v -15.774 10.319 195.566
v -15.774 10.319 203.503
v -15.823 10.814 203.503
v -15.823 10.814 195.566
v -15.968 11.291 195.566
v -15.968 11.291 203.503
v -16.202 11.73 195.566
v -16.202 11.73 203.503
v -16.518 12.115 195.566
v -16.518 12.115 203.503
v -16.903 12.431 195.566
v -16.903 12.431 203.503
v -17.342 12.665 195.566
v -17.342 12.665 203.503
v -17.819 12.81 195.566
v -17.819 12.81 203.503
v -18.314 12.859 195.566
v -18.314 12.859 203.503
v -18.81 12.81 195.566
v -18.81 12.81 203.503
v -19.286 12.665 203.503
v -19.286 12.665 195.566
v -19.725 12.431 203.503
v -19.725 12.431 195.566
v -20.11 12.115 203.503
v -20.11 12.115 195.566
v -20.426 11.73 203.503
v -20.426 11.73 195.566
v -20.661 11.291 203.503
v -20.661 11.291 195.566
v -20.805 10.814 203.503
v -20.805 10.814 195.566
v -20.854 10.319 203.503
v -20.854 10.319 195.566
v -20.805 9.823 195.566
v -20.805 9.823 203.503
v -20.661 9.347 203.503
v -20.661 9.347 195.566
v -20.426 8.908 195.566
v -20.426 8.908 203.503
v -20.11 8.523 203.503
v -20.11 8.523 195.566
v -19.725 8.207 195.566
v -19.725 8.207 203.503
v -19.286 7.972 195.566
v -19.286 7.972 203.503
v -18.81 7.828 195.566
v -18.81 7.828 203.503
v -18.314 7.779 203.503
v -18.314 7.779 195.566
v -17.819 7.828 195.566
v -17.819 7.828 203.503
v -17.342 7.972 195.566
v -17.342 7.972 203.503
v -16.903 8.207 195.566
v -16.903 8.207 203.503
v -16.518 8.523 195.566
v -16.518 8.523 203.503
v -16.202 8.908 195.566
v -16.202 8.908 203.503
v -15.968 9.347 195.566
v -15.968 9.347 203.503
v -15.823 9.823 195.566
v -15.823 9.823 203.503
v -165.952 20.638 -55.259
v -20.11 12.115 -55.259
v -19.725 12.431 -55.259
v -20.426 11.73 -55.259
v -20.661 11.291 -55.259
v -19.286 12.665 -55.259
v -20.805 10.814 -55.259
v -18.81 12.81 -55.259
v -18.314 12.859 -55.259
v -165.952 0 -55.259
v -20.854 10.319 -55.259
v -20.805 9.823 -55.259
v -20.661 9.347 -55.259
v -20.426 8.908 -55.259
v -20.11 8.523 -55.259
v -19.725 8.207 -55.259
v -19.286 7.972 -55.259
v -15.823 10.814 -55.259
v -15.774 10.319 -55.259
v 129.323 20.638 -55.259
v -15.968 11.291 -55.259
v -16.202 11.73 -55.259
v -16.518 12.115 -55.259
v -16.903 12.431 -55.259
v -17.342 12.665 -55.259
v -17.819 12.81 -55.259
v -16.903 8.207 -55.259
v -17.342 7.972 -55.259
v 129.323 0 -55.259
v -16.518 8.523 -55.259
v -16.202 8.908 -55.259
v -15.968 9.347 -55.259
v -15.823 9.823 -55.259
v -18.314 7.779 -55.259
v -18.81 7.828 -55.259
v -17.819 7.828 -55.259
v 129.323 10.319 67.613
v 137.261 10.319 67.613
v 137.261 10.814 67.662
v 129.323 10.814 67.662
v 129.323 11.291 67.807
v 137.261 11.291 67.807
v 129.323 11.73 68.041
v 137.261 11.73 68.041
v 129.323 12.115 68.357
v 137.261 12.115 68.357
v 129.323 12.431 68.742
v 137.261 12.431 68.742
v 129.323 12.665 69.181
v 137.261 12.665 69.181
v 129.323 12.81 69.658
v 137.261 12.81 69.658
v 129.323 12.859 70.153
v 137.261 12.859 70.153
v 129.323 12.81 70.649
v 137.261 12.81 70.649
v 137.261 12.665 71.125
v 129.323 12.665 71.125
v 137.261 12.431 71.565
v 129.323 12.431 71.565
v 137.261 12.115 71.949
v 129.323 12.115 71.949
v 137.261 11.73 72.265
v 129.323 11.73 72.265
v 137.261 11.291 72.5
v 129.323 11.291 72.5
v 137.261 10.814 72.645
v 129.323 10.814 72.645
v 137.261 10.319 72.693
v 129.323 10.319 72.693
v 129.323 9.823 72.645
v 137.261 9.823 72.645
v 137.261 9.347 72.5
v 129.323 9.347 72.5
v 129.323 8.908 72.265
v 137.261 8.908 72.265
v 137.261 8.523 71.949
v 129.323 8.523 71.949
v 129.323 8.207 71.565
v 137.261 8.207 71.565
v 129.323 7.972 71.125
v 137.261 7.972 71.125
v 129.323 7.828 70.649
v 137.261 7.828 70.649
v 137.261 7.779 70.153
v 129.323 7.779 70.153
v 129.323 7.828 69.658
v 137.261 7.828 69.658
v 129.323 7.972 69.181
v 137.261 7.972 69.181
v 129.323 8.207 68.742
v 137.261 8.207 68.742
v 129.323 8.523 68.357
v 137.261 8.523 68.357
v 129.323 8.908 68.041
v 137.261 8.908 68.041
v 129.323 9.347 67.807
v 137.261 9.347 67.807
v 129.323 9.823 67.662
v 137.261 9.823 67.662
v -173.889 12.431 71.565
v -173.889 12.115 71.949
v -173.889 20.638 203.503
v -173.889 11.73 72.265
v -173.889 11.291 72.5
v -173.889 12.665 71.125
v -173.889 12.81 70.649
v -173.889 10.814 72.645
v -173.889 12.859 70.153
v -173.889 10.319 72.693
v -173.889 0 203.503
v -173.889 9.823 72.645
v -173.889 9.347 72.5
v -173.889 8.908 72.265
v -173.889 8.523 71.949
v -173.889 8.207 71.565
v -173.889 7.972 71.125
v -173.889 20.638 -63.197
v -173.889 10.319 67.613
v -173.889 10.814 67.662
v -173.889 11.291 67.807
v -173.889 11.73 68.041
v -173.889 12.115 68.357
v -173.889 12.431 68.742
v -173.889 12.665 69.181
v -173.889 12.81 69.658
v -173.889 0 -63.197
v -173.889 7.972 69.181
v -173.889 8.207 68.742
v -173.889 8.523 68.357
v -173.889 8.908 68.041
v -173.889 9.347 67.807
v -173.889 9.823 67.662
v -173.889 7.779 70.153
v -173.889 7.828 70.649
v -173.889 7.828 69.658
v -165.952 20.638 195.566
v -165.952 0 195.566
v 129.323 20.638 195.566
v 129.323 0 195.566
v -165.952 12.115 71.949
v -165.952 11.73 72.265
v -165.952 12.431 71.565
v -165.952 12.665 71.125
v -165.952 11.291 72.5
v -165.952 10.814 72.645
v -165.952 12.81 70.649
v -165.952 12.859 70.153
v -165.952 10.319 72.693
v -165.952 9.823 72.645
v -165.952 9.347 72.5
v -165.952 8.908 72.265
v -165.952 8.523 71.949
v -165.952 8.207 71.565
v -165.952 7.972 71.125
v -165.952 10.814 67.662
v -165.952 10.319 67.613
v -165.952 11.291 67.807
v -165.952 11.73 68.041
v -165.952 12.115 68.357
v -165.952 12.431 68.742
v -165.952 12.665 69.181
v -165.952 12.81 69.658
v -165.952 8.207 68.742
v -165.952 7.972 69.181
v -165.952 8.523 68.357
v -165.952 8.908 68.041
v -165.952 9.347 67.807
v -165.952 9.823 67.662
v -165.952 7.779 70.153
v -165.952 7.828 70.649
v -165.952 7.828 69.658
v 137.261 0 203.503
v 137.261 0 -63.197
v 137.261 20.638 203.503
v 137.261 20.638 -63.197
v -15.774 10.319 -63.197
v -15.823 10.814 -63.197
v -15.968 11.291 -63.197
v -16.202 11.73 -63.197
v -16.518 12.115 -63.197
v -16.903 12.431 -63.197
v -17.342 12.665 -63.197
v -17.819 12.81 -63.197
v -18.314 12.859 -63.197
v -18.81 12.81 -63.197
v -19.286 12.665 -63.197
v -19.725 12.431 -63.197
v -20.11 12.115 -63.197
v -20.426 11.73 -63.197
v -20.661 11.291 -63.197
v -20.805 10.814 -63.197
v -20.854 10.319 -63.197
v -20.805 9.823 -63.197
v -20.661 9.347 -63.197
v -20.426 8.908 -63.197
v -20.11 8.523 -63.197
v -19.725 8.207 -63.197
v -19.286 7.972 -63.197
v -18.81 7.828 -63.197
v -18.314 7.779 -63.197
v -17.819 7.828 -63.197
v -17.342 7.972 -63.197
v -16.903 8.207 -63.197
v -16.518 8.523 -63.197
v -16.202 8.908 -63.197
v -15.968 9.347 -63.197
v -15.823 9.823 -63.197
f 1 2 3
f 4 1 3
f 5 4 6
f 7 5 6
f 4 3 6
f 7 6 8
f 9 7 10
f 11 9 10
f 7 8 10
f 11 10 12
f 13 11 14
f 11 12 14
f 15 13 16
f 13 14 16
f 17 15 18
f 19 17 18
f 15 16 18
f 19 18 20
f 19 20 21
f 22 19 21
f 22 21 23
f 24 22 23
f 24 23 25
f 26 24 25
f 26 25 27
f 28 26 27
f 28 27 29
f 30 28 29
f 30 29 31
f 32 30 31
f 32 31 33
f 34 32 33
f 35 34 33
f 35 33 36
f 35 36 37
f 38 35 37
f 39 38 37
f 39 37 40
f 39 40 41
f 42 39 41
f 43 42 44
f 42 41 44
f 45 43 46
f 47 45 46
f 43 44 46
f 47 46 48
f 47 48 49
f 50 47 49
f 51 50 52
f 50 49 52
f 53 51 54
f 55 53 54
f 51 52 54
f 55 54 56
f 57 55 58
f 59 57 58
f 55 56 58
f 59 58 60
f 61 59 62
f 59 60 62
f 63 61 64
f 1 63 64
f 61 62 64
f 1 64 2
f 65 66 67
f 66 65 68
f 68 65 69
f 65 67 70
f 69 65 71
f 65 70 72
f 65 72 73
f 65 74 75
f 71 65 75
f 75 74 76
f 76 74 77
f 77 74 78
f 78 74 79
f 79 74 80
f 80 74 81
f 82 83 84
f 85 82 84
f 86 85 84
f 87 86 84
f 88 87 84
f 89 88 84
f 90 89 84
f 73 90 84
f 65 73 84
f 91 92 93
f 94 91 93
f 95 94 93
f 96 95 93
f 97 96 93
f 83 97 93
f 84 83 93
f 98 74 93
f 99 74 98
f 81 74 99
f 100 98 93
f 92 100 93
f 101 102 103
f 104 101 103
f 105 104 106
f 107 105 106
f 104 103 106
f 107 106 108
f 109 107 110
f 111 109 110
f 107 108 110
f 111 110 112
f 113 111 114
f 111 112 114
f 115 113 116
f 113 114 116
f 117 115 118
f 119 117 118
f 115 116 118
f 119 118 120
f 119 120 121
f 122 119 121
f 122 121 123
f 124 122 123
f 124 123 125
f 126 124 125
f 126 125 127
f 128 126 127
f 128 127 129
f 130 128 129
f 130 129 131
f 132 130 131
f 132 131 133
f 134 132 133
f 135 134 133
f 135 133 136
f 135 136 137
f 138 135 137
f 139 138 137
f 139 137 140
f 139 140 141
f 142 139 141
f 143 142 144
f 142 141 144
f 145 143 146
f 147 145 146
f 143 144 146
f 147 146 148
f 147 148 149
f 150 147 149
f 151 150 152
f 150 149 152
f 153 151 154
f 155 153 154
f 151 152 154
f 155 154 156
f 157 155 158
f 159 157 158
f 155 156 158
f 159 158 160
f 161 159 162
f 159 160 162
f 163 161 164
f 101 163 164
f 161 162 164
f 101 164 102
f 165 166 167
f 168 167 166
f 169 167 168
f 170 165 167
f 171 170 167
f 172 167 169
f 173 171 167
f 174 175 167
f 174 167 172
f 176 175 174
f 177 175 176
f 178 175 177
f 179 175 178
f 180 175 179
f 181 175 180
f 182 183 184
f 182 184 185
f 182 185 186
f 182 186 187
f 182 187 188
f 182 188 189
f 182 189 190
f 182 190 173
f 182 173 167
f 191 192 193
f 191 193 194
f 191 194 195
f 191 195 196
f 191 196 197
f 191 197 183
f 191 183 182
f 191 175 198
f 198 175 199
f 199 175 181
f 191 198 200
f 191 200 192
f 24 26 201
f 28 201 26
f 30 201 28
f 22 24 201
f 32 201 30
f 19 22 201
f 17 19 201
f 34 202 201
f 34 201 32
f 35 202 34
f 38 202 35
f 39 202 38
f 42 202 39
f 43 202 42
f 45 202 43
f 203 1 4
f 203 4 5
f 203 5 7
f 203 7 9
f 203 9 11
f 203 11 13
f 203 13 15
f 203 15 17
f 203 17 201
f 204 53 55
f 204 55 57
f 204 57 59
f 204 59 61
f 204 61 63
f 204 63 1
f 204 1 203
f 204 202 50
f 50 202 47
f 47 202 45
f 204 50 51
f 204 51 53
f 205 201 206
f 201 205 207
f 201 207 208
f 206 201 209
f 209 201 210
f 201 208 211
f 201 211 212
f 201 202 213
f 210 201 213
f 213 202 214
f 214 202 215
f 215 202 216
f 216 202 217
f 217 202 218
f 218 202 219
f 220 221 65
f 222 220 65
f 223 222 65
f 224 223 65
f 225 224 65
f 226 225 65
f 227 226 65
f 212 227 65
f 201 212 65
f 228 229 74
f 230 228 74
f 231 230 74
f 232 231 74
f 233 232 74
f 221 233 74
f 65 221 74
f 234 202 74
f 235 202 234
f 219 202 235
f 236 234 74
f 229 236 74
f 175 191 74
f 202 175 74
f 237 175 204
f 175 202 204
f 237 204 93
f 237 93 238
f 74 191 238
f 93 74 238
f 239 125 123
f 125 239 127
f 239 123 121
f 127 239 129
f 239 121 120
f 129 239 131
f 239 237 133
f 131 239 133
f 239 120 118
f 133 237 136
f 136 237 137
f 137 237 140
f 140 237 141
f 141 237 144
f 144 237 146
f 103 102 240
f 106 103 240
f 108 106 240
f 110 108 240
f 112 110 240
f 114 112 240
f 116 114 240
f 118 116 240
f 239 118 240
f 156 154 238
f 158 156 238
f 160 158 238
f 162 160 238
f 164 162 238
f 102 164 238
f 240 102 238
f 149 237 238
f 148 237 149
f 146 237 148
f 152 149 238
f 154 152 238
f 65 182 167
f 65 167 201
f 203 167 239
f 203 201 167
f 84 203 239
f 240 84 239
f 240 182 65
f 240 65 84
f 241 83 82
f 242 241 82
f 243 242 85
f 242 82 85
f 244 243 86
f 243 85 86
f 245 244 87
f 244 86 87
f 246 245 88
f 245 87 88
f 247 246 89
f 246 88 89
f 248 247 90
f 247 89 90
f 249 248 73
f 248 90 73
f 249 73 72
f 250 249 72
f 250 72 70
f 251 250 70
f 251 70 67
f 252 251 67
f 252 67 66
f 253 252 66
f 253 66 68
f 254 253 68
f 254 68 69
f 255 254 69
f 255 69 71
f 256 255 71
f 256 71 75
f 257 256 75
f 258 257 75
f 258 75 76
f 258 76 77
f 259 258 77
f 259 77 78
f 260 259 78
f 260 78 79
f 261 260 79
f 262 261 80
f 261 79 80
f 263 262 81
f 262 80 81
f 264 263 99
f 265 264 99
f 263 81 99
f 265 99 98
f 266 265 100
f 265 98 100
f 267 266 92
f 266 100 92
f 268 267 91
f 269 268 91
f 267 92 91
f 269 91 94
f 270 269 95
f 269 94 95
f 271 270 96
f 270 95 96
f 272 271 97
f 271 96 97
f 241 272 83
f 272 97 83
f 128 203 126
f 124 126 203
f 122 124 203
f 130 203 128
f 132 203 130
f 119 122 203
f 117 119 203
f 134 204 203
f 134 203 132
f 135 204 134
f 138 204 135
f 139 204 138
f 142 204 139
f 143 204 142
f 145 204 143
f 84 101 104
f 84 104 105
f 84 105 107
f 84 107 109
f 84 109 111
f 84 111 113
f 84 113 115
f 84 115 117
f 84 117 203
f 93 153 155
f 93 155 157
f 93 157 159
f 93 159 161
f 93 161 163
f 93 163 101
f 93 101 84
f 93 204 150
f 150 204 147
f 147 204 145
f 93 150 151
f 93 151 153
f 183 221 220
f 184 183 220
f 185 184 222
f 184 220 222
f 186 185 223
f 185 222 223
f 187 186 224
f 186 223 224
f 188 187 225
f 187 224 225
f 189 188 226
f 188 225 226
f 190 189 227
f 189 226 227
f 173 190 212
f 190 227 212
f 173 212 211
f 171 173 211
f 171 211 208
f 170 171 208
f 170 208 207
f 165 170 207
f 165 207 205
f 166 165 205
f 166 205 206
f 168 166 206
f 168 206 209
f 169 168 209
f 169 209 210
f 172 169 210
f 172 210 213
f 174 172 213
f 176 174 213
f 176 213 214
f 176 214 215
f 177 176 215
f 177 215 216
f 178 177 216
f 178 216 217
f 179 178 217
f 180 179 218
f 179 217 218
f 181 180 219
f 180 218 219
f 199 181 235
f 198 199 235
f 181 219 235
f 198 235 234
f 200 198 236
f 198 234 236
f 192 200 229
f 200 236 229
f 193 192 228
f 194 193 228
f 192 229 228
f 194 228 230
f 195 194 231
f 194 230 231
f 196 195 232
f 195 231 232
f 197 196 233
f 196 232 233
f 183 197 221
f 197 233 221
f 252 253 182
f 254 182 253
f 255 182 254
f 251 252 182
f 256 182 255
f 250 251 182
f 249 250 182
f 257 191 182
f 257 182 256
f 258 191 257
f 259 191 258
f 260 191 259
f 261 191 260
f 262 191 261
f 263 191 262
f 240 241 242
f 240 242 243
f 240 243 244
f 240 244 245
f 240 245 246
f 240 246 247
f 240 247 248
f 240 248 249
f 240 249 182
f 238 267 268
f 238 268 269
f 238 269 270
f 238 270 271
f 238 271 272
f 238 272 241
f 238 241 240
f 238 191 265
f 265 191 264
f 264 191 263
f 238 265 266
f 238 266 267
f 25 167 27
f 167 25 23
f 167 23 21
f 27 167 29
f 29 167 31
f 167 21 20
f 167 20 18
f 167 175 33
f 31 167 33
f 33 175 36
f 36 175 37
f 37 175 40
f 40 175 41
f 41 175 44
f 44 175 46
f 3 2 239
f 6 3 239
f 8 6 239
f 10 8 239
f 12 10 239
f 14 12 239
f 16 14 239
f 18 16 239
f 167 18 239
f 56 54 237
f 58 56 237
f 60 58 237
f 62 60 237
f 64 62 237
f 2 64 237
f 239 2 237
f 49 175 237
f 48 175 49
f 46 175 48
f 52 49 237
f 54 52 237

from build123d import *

# Parameters (mm, degrees)
SKETCH1_W           = 311.15
SKETCH1_H           = 266.7
SKETCH1_W_2         = 295.275
SKETCH1_H_2         = 250.825
BOSS_EXTRUDE1_DEPTH = 20.6375
SKETCH2_R           = 2.54
CUT_EXTRUDE1_DEPTH  = 320.049014669
SKETCH3_R           = 2.54
CUT_EXTRUDE2_DEPTH  = 373.362542974


with BuildPart() as part:
    # Sketch1 → Boss-Extrude1 (new body)
    with BuildSketch(Plane(origin=(0, 0, 0), x_dir=(1, 0, 0), z_dir=(0, 1, 0))):
        with Locations((-18.31426751, -70.1534017)):
            Rectangle(SKETCH1_W, SKETCH1_H)
        with Locations((-18.31426751, -70.1534017)):
            Rectangle(SKETCH1_W_2, SKETCH1_H_2, mode=Mode.SUBTRACT)
    extrude(amount=BOSS_EXTRUDE1_DEPTH)

    # Sketch2 → Cut-Extrude1 (cut, through all)
    with BuildSketch(Plane.XY.offset(203.5034017)):
        with Locations((-18.31426751, 10.31875)):
            Circle(SKETCH2_R)
    extrude(amount=-CUT_EXTRUDE1_DEPTH, mode=Mode.SUBTRACT)

    # Sketch3 → Cut-Extrude2 (cut, through all)
    with BuildSketch(Plane(origin=(137.26073249, 0, 0), x_dir=(0, 0, -1), z_dir=(1, 0, 0))):
        with Locations((-70.1534017, 10.31875)):
            Circle(SKETCH3_R)
    extrude(amount=-CUT_EXTRUDE2_DEPTH, mode=Mode.SUBTRACT)


solid = part.part
